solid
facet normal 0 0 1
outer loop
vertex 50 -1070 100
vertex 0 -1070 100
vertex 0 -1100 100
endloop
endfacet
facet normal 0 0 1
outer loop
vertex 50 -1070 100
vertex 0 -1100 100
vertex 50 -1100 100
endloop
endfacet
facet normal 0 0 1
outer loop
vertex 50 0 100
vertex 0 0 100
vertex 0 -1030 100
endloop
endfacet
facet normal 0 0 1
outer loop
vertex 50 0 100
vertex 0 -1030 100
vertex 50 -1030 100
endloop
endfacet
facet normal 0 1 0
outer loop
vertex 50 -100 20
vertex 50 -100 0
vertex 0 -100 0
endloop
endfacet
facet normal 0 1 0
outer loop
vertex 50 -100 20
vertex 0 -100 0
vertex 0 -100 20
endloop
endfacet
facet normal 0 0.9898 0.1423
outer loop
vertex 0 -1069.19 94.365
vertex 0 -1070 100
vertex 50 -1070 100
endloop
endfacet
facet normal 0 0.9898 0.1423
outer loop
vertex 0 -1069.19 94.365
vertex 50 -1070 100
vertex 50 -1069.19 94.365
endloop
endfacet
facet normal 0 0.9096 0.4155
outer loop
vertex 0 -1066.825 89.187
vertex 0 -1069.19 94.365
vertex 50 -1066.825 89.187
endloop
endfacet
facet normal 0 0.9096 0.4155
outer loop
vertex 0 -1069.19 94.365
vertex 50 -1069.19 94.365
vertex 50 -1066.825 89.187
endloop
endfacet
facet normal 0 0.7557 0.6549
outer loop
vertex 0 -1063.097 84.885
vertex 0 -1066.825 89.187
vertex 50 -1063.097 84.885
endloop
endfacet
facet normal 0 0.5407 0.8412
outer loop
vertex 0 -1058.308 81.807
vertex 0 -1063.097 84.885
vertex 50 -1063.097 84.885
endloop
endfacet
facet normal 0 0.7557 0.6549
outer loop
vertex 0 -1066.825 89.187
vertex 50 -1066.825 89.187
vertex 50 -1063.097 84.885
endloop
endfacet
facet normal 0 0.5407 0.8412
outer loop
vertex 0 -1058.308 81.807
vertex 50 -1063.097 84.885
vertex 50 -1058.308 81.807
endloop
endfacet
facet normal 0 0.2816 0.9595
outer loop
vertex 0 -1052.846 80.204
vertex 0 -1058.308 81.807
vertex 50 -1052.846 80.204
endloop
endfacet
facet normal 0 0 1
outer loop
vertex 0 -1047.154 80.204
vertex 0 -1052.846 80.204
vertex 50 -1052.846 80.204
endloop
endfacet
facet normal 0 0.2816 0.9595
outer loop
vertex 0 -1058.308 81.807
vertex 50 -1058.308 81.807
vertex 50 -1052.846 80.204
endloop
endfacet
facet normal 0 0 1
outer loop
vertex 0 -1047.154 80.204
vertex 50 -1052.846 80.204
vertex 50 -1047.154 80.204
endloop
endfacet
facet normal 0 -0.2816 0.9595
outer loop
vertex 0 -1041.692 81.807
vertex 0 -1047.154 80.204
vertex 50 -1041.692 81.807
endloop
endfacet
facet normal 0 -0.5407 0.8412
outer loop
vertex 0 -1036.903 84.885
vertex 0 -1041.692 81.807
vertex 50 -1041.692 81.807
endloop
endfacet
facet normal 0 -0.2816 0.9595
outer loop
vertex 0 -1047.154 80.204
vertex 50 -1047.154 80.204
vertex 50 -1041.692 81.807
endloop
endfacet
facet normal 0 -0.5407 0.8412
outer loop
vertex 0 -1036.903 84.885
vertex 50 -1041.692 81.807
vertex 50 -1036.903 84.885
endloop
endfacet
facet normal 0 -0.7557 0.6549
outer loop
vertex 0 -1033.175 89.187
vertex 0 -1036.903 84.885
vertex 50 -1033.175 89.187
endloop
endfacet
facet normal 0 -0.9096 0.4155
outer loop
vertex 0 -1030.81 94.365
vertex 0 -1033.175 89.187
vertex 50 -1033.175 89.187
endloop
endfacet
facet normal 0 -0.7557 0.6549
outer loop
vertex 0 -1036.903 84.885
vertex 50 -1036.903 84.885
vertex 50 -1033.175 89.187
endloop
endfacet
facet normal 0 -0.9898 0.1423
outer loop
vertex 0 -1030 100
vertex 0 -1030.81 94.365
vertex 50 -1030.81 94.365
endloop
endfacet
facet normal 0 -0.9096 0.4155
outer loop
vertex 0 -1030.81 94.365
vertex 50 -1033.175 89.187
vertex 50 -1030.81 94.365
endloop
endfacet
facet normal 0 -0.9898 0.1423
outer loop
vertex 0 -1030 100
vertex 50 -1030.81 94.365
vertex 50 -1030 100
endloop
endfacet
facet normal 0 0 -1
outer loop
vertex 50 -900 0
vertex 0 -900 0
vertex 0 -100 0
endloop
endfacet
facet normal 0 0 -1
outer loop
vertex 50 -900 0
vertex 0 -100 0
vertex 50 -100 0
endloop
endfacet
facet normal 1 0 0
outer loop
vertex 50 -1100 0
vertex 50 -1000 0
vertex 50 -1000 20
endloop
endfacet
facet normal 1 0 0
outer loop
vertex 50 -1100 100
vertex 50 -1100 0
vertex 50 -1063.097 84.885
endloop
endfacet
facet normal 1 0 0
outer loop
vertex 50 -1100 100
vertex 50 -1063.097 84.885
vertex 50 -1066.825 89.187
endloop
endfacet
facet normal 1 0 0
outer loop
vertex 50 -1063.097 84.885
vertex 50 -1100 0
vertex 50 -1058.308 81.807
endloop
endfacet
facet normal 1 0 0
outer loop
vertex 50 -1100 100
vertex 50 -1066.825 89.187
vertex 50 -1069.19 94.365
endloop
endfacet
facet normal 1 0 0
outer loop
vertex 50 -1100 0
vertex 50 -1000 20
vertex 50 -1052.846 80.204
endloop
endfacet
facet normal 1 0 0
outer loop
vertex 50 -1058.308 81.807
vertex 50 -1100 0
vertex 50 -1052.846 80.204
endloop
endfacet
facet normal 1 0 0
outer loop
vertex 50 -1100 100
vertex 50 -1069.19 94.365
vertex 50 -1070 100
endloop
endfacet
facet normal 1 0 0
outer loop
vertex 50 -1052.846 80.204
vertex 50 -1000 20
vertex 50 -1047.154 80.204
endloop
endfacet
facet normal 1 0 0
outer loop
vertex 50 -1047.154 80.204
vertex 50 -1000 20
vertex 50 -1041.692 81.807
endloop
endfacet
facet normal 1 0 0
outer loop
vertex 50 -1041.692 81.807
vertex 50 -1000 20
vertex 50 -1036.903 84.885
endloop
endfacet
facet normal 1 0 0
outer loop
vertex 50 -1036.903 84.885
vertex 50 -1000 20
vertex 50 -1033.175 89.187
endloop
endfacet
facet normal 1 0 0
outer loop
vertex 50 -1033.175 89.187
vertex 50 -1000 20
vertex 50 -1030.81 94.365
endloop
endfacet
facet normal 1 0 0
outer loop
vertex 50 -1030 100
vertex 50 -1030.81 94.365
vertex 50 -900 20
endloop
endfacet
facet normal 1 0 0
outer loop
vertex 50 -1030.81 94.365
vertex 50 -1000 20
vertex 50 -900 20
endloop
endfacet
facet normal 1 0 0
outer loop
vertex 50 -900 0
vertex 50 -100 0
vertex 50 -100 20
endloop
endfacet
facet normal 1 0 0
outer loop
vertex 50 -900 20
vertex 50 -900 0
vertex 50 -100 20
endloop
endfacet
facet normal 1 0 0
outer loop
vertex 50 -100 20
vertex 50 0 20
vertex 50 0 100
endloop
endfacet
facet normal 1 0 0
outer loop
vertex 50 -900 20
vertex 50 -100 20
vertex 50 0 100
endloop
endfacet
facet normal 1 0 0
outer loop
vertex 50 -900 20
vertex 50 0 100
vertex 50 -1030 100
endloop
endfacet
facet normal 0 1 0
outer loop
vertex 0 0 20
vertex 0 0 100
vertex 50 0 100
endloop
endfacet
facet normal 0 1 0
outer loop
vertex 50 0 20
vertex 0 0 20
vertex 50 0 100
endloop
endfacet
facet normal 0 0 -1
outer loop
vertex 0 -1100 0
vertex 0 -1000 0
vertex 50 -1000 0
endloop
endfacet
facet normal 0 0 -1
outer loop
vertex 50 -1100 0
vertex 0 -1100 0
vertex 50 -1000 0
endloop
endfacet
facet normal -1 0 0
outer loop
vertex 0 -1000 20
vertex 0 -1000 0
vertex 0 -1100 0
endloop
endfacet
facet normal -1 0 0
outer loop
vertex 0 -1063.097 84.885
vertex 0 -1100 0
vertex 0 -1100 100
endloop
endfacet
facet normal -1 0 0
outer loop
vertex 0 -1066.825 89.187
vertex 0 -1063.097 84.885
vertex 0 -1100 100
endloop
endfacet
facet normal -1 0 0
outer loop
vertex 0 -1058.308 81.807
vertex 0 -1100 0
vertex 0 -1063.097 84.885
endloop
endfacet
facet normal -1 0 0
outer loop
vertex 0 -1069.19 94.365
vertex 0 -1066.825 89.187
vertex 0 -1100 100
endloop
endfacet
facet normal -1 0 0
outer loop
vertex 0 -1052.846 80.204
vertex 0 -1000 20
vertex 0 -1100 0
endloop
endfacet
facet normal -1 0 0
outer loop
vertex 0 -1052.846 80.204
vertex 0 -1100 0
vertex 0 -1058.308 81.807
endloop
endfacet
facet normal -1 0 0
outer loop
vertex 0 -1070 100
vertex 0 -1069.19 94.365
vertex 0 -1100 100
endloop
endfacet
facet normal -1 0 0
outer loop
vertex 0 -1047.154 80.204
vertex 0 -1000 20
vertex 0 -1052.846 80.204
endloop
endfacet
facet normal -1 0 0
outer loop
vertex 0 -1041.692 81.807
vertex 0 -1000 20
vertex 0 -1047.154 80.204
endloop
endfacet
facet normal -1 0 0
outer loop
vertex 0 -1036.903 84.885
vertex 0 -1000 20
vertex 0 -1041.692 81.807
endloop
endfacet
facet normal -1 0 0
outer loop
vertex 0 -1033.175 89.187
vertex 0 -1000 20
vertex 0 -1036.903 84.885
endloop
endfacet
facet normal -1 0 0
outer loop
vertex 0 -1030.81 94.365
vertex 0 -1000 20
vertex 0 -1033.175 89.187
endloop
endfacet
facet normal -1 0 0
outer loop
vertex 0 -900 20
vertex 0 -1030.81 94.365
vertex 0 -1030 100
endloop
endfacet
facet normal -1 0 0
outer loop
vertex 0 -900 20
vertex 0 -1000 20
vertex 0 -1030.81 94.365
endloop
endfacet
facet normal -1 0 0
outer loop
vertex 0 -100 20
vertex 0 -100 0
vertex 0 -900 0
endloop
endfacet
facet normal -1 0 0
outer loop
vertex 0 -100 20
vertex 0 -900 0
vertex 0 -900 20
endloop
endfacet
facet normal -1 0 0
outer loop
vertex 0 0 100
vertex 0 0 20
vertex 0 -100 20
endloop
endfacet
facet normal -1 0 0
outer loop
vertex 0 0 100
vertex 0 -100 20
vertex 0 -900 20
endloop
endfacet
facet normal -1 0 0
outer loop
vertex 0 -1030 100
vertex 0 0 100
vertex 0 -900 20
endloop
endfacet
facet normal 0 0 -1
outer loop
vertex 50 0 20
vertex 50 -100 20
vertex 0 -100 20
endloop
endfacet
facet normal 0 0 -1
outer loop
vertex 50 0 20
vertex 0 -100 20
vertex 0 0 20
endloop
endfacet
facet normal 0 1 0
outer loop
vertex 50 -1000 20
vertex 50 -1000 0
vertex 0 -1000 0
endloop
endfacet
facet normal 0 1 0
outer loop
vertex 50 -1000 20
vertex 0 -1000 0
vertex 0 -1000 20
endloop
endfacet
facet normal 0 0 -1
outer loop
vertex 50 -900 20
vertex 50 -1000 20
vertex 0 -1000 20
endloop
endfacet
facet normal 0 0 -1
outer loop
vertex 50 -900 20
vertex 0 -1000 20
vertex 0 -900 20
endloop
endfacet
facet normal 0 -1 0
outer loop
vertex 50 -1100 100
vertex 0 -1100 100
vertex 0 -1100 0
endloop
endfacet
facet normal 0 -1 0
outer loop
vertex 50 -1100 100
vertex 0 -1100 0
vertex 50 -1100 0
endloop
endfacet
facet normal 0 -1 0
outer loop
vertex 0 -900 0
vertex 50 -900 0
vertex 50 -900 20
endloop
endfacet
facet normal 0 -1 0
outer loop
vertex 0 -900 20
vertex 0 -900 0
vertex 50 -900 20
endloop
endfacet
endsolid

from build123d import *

# Parameters (mm, degrees)
F0_W     = 50
F0_H     = 100
F1_DEPTH = 1100
F2_W     = 100
F2_H     = 20
F3_DEPTH = 50.001
F5_DEPTH = 50.001


with BuildPart() as f1:
    # F0 (on Front) → F1 (new body)
    with BuildSketch(Plane.XZ):
        with Locations((25, 50)):
            Rectangle(F0_W, F0_H)
    extrude(amount=F1_DEPTH)

    # F2 (on face) → F3 (cut, through all)
    with BuildSketch(Plane.YZ.offset(50)):
        with Locations((-50, 10)):
            Rectangle(F2_W, F2_H)
        with Locations((-950, 10)):
            Rectangle(F2_W, F2_H)
    extrude(amount=-F3_DEPTH, mode=Mode.SUBTRACT)

    # F4 (on face) → F5 (cut, through all)
    with BuildSketch(Plane.YZ.offset(50)):
        with BuildLine():
            Line((-1030, 100), (-1070, 100))
            ThreePointArc((-1070, 100), (-1050, 80), (-1030, 100))
        make_face()
    extrude(amount=-F5_DEPTH, mode=Mode.SUBTRACT)


solid = f1.part
